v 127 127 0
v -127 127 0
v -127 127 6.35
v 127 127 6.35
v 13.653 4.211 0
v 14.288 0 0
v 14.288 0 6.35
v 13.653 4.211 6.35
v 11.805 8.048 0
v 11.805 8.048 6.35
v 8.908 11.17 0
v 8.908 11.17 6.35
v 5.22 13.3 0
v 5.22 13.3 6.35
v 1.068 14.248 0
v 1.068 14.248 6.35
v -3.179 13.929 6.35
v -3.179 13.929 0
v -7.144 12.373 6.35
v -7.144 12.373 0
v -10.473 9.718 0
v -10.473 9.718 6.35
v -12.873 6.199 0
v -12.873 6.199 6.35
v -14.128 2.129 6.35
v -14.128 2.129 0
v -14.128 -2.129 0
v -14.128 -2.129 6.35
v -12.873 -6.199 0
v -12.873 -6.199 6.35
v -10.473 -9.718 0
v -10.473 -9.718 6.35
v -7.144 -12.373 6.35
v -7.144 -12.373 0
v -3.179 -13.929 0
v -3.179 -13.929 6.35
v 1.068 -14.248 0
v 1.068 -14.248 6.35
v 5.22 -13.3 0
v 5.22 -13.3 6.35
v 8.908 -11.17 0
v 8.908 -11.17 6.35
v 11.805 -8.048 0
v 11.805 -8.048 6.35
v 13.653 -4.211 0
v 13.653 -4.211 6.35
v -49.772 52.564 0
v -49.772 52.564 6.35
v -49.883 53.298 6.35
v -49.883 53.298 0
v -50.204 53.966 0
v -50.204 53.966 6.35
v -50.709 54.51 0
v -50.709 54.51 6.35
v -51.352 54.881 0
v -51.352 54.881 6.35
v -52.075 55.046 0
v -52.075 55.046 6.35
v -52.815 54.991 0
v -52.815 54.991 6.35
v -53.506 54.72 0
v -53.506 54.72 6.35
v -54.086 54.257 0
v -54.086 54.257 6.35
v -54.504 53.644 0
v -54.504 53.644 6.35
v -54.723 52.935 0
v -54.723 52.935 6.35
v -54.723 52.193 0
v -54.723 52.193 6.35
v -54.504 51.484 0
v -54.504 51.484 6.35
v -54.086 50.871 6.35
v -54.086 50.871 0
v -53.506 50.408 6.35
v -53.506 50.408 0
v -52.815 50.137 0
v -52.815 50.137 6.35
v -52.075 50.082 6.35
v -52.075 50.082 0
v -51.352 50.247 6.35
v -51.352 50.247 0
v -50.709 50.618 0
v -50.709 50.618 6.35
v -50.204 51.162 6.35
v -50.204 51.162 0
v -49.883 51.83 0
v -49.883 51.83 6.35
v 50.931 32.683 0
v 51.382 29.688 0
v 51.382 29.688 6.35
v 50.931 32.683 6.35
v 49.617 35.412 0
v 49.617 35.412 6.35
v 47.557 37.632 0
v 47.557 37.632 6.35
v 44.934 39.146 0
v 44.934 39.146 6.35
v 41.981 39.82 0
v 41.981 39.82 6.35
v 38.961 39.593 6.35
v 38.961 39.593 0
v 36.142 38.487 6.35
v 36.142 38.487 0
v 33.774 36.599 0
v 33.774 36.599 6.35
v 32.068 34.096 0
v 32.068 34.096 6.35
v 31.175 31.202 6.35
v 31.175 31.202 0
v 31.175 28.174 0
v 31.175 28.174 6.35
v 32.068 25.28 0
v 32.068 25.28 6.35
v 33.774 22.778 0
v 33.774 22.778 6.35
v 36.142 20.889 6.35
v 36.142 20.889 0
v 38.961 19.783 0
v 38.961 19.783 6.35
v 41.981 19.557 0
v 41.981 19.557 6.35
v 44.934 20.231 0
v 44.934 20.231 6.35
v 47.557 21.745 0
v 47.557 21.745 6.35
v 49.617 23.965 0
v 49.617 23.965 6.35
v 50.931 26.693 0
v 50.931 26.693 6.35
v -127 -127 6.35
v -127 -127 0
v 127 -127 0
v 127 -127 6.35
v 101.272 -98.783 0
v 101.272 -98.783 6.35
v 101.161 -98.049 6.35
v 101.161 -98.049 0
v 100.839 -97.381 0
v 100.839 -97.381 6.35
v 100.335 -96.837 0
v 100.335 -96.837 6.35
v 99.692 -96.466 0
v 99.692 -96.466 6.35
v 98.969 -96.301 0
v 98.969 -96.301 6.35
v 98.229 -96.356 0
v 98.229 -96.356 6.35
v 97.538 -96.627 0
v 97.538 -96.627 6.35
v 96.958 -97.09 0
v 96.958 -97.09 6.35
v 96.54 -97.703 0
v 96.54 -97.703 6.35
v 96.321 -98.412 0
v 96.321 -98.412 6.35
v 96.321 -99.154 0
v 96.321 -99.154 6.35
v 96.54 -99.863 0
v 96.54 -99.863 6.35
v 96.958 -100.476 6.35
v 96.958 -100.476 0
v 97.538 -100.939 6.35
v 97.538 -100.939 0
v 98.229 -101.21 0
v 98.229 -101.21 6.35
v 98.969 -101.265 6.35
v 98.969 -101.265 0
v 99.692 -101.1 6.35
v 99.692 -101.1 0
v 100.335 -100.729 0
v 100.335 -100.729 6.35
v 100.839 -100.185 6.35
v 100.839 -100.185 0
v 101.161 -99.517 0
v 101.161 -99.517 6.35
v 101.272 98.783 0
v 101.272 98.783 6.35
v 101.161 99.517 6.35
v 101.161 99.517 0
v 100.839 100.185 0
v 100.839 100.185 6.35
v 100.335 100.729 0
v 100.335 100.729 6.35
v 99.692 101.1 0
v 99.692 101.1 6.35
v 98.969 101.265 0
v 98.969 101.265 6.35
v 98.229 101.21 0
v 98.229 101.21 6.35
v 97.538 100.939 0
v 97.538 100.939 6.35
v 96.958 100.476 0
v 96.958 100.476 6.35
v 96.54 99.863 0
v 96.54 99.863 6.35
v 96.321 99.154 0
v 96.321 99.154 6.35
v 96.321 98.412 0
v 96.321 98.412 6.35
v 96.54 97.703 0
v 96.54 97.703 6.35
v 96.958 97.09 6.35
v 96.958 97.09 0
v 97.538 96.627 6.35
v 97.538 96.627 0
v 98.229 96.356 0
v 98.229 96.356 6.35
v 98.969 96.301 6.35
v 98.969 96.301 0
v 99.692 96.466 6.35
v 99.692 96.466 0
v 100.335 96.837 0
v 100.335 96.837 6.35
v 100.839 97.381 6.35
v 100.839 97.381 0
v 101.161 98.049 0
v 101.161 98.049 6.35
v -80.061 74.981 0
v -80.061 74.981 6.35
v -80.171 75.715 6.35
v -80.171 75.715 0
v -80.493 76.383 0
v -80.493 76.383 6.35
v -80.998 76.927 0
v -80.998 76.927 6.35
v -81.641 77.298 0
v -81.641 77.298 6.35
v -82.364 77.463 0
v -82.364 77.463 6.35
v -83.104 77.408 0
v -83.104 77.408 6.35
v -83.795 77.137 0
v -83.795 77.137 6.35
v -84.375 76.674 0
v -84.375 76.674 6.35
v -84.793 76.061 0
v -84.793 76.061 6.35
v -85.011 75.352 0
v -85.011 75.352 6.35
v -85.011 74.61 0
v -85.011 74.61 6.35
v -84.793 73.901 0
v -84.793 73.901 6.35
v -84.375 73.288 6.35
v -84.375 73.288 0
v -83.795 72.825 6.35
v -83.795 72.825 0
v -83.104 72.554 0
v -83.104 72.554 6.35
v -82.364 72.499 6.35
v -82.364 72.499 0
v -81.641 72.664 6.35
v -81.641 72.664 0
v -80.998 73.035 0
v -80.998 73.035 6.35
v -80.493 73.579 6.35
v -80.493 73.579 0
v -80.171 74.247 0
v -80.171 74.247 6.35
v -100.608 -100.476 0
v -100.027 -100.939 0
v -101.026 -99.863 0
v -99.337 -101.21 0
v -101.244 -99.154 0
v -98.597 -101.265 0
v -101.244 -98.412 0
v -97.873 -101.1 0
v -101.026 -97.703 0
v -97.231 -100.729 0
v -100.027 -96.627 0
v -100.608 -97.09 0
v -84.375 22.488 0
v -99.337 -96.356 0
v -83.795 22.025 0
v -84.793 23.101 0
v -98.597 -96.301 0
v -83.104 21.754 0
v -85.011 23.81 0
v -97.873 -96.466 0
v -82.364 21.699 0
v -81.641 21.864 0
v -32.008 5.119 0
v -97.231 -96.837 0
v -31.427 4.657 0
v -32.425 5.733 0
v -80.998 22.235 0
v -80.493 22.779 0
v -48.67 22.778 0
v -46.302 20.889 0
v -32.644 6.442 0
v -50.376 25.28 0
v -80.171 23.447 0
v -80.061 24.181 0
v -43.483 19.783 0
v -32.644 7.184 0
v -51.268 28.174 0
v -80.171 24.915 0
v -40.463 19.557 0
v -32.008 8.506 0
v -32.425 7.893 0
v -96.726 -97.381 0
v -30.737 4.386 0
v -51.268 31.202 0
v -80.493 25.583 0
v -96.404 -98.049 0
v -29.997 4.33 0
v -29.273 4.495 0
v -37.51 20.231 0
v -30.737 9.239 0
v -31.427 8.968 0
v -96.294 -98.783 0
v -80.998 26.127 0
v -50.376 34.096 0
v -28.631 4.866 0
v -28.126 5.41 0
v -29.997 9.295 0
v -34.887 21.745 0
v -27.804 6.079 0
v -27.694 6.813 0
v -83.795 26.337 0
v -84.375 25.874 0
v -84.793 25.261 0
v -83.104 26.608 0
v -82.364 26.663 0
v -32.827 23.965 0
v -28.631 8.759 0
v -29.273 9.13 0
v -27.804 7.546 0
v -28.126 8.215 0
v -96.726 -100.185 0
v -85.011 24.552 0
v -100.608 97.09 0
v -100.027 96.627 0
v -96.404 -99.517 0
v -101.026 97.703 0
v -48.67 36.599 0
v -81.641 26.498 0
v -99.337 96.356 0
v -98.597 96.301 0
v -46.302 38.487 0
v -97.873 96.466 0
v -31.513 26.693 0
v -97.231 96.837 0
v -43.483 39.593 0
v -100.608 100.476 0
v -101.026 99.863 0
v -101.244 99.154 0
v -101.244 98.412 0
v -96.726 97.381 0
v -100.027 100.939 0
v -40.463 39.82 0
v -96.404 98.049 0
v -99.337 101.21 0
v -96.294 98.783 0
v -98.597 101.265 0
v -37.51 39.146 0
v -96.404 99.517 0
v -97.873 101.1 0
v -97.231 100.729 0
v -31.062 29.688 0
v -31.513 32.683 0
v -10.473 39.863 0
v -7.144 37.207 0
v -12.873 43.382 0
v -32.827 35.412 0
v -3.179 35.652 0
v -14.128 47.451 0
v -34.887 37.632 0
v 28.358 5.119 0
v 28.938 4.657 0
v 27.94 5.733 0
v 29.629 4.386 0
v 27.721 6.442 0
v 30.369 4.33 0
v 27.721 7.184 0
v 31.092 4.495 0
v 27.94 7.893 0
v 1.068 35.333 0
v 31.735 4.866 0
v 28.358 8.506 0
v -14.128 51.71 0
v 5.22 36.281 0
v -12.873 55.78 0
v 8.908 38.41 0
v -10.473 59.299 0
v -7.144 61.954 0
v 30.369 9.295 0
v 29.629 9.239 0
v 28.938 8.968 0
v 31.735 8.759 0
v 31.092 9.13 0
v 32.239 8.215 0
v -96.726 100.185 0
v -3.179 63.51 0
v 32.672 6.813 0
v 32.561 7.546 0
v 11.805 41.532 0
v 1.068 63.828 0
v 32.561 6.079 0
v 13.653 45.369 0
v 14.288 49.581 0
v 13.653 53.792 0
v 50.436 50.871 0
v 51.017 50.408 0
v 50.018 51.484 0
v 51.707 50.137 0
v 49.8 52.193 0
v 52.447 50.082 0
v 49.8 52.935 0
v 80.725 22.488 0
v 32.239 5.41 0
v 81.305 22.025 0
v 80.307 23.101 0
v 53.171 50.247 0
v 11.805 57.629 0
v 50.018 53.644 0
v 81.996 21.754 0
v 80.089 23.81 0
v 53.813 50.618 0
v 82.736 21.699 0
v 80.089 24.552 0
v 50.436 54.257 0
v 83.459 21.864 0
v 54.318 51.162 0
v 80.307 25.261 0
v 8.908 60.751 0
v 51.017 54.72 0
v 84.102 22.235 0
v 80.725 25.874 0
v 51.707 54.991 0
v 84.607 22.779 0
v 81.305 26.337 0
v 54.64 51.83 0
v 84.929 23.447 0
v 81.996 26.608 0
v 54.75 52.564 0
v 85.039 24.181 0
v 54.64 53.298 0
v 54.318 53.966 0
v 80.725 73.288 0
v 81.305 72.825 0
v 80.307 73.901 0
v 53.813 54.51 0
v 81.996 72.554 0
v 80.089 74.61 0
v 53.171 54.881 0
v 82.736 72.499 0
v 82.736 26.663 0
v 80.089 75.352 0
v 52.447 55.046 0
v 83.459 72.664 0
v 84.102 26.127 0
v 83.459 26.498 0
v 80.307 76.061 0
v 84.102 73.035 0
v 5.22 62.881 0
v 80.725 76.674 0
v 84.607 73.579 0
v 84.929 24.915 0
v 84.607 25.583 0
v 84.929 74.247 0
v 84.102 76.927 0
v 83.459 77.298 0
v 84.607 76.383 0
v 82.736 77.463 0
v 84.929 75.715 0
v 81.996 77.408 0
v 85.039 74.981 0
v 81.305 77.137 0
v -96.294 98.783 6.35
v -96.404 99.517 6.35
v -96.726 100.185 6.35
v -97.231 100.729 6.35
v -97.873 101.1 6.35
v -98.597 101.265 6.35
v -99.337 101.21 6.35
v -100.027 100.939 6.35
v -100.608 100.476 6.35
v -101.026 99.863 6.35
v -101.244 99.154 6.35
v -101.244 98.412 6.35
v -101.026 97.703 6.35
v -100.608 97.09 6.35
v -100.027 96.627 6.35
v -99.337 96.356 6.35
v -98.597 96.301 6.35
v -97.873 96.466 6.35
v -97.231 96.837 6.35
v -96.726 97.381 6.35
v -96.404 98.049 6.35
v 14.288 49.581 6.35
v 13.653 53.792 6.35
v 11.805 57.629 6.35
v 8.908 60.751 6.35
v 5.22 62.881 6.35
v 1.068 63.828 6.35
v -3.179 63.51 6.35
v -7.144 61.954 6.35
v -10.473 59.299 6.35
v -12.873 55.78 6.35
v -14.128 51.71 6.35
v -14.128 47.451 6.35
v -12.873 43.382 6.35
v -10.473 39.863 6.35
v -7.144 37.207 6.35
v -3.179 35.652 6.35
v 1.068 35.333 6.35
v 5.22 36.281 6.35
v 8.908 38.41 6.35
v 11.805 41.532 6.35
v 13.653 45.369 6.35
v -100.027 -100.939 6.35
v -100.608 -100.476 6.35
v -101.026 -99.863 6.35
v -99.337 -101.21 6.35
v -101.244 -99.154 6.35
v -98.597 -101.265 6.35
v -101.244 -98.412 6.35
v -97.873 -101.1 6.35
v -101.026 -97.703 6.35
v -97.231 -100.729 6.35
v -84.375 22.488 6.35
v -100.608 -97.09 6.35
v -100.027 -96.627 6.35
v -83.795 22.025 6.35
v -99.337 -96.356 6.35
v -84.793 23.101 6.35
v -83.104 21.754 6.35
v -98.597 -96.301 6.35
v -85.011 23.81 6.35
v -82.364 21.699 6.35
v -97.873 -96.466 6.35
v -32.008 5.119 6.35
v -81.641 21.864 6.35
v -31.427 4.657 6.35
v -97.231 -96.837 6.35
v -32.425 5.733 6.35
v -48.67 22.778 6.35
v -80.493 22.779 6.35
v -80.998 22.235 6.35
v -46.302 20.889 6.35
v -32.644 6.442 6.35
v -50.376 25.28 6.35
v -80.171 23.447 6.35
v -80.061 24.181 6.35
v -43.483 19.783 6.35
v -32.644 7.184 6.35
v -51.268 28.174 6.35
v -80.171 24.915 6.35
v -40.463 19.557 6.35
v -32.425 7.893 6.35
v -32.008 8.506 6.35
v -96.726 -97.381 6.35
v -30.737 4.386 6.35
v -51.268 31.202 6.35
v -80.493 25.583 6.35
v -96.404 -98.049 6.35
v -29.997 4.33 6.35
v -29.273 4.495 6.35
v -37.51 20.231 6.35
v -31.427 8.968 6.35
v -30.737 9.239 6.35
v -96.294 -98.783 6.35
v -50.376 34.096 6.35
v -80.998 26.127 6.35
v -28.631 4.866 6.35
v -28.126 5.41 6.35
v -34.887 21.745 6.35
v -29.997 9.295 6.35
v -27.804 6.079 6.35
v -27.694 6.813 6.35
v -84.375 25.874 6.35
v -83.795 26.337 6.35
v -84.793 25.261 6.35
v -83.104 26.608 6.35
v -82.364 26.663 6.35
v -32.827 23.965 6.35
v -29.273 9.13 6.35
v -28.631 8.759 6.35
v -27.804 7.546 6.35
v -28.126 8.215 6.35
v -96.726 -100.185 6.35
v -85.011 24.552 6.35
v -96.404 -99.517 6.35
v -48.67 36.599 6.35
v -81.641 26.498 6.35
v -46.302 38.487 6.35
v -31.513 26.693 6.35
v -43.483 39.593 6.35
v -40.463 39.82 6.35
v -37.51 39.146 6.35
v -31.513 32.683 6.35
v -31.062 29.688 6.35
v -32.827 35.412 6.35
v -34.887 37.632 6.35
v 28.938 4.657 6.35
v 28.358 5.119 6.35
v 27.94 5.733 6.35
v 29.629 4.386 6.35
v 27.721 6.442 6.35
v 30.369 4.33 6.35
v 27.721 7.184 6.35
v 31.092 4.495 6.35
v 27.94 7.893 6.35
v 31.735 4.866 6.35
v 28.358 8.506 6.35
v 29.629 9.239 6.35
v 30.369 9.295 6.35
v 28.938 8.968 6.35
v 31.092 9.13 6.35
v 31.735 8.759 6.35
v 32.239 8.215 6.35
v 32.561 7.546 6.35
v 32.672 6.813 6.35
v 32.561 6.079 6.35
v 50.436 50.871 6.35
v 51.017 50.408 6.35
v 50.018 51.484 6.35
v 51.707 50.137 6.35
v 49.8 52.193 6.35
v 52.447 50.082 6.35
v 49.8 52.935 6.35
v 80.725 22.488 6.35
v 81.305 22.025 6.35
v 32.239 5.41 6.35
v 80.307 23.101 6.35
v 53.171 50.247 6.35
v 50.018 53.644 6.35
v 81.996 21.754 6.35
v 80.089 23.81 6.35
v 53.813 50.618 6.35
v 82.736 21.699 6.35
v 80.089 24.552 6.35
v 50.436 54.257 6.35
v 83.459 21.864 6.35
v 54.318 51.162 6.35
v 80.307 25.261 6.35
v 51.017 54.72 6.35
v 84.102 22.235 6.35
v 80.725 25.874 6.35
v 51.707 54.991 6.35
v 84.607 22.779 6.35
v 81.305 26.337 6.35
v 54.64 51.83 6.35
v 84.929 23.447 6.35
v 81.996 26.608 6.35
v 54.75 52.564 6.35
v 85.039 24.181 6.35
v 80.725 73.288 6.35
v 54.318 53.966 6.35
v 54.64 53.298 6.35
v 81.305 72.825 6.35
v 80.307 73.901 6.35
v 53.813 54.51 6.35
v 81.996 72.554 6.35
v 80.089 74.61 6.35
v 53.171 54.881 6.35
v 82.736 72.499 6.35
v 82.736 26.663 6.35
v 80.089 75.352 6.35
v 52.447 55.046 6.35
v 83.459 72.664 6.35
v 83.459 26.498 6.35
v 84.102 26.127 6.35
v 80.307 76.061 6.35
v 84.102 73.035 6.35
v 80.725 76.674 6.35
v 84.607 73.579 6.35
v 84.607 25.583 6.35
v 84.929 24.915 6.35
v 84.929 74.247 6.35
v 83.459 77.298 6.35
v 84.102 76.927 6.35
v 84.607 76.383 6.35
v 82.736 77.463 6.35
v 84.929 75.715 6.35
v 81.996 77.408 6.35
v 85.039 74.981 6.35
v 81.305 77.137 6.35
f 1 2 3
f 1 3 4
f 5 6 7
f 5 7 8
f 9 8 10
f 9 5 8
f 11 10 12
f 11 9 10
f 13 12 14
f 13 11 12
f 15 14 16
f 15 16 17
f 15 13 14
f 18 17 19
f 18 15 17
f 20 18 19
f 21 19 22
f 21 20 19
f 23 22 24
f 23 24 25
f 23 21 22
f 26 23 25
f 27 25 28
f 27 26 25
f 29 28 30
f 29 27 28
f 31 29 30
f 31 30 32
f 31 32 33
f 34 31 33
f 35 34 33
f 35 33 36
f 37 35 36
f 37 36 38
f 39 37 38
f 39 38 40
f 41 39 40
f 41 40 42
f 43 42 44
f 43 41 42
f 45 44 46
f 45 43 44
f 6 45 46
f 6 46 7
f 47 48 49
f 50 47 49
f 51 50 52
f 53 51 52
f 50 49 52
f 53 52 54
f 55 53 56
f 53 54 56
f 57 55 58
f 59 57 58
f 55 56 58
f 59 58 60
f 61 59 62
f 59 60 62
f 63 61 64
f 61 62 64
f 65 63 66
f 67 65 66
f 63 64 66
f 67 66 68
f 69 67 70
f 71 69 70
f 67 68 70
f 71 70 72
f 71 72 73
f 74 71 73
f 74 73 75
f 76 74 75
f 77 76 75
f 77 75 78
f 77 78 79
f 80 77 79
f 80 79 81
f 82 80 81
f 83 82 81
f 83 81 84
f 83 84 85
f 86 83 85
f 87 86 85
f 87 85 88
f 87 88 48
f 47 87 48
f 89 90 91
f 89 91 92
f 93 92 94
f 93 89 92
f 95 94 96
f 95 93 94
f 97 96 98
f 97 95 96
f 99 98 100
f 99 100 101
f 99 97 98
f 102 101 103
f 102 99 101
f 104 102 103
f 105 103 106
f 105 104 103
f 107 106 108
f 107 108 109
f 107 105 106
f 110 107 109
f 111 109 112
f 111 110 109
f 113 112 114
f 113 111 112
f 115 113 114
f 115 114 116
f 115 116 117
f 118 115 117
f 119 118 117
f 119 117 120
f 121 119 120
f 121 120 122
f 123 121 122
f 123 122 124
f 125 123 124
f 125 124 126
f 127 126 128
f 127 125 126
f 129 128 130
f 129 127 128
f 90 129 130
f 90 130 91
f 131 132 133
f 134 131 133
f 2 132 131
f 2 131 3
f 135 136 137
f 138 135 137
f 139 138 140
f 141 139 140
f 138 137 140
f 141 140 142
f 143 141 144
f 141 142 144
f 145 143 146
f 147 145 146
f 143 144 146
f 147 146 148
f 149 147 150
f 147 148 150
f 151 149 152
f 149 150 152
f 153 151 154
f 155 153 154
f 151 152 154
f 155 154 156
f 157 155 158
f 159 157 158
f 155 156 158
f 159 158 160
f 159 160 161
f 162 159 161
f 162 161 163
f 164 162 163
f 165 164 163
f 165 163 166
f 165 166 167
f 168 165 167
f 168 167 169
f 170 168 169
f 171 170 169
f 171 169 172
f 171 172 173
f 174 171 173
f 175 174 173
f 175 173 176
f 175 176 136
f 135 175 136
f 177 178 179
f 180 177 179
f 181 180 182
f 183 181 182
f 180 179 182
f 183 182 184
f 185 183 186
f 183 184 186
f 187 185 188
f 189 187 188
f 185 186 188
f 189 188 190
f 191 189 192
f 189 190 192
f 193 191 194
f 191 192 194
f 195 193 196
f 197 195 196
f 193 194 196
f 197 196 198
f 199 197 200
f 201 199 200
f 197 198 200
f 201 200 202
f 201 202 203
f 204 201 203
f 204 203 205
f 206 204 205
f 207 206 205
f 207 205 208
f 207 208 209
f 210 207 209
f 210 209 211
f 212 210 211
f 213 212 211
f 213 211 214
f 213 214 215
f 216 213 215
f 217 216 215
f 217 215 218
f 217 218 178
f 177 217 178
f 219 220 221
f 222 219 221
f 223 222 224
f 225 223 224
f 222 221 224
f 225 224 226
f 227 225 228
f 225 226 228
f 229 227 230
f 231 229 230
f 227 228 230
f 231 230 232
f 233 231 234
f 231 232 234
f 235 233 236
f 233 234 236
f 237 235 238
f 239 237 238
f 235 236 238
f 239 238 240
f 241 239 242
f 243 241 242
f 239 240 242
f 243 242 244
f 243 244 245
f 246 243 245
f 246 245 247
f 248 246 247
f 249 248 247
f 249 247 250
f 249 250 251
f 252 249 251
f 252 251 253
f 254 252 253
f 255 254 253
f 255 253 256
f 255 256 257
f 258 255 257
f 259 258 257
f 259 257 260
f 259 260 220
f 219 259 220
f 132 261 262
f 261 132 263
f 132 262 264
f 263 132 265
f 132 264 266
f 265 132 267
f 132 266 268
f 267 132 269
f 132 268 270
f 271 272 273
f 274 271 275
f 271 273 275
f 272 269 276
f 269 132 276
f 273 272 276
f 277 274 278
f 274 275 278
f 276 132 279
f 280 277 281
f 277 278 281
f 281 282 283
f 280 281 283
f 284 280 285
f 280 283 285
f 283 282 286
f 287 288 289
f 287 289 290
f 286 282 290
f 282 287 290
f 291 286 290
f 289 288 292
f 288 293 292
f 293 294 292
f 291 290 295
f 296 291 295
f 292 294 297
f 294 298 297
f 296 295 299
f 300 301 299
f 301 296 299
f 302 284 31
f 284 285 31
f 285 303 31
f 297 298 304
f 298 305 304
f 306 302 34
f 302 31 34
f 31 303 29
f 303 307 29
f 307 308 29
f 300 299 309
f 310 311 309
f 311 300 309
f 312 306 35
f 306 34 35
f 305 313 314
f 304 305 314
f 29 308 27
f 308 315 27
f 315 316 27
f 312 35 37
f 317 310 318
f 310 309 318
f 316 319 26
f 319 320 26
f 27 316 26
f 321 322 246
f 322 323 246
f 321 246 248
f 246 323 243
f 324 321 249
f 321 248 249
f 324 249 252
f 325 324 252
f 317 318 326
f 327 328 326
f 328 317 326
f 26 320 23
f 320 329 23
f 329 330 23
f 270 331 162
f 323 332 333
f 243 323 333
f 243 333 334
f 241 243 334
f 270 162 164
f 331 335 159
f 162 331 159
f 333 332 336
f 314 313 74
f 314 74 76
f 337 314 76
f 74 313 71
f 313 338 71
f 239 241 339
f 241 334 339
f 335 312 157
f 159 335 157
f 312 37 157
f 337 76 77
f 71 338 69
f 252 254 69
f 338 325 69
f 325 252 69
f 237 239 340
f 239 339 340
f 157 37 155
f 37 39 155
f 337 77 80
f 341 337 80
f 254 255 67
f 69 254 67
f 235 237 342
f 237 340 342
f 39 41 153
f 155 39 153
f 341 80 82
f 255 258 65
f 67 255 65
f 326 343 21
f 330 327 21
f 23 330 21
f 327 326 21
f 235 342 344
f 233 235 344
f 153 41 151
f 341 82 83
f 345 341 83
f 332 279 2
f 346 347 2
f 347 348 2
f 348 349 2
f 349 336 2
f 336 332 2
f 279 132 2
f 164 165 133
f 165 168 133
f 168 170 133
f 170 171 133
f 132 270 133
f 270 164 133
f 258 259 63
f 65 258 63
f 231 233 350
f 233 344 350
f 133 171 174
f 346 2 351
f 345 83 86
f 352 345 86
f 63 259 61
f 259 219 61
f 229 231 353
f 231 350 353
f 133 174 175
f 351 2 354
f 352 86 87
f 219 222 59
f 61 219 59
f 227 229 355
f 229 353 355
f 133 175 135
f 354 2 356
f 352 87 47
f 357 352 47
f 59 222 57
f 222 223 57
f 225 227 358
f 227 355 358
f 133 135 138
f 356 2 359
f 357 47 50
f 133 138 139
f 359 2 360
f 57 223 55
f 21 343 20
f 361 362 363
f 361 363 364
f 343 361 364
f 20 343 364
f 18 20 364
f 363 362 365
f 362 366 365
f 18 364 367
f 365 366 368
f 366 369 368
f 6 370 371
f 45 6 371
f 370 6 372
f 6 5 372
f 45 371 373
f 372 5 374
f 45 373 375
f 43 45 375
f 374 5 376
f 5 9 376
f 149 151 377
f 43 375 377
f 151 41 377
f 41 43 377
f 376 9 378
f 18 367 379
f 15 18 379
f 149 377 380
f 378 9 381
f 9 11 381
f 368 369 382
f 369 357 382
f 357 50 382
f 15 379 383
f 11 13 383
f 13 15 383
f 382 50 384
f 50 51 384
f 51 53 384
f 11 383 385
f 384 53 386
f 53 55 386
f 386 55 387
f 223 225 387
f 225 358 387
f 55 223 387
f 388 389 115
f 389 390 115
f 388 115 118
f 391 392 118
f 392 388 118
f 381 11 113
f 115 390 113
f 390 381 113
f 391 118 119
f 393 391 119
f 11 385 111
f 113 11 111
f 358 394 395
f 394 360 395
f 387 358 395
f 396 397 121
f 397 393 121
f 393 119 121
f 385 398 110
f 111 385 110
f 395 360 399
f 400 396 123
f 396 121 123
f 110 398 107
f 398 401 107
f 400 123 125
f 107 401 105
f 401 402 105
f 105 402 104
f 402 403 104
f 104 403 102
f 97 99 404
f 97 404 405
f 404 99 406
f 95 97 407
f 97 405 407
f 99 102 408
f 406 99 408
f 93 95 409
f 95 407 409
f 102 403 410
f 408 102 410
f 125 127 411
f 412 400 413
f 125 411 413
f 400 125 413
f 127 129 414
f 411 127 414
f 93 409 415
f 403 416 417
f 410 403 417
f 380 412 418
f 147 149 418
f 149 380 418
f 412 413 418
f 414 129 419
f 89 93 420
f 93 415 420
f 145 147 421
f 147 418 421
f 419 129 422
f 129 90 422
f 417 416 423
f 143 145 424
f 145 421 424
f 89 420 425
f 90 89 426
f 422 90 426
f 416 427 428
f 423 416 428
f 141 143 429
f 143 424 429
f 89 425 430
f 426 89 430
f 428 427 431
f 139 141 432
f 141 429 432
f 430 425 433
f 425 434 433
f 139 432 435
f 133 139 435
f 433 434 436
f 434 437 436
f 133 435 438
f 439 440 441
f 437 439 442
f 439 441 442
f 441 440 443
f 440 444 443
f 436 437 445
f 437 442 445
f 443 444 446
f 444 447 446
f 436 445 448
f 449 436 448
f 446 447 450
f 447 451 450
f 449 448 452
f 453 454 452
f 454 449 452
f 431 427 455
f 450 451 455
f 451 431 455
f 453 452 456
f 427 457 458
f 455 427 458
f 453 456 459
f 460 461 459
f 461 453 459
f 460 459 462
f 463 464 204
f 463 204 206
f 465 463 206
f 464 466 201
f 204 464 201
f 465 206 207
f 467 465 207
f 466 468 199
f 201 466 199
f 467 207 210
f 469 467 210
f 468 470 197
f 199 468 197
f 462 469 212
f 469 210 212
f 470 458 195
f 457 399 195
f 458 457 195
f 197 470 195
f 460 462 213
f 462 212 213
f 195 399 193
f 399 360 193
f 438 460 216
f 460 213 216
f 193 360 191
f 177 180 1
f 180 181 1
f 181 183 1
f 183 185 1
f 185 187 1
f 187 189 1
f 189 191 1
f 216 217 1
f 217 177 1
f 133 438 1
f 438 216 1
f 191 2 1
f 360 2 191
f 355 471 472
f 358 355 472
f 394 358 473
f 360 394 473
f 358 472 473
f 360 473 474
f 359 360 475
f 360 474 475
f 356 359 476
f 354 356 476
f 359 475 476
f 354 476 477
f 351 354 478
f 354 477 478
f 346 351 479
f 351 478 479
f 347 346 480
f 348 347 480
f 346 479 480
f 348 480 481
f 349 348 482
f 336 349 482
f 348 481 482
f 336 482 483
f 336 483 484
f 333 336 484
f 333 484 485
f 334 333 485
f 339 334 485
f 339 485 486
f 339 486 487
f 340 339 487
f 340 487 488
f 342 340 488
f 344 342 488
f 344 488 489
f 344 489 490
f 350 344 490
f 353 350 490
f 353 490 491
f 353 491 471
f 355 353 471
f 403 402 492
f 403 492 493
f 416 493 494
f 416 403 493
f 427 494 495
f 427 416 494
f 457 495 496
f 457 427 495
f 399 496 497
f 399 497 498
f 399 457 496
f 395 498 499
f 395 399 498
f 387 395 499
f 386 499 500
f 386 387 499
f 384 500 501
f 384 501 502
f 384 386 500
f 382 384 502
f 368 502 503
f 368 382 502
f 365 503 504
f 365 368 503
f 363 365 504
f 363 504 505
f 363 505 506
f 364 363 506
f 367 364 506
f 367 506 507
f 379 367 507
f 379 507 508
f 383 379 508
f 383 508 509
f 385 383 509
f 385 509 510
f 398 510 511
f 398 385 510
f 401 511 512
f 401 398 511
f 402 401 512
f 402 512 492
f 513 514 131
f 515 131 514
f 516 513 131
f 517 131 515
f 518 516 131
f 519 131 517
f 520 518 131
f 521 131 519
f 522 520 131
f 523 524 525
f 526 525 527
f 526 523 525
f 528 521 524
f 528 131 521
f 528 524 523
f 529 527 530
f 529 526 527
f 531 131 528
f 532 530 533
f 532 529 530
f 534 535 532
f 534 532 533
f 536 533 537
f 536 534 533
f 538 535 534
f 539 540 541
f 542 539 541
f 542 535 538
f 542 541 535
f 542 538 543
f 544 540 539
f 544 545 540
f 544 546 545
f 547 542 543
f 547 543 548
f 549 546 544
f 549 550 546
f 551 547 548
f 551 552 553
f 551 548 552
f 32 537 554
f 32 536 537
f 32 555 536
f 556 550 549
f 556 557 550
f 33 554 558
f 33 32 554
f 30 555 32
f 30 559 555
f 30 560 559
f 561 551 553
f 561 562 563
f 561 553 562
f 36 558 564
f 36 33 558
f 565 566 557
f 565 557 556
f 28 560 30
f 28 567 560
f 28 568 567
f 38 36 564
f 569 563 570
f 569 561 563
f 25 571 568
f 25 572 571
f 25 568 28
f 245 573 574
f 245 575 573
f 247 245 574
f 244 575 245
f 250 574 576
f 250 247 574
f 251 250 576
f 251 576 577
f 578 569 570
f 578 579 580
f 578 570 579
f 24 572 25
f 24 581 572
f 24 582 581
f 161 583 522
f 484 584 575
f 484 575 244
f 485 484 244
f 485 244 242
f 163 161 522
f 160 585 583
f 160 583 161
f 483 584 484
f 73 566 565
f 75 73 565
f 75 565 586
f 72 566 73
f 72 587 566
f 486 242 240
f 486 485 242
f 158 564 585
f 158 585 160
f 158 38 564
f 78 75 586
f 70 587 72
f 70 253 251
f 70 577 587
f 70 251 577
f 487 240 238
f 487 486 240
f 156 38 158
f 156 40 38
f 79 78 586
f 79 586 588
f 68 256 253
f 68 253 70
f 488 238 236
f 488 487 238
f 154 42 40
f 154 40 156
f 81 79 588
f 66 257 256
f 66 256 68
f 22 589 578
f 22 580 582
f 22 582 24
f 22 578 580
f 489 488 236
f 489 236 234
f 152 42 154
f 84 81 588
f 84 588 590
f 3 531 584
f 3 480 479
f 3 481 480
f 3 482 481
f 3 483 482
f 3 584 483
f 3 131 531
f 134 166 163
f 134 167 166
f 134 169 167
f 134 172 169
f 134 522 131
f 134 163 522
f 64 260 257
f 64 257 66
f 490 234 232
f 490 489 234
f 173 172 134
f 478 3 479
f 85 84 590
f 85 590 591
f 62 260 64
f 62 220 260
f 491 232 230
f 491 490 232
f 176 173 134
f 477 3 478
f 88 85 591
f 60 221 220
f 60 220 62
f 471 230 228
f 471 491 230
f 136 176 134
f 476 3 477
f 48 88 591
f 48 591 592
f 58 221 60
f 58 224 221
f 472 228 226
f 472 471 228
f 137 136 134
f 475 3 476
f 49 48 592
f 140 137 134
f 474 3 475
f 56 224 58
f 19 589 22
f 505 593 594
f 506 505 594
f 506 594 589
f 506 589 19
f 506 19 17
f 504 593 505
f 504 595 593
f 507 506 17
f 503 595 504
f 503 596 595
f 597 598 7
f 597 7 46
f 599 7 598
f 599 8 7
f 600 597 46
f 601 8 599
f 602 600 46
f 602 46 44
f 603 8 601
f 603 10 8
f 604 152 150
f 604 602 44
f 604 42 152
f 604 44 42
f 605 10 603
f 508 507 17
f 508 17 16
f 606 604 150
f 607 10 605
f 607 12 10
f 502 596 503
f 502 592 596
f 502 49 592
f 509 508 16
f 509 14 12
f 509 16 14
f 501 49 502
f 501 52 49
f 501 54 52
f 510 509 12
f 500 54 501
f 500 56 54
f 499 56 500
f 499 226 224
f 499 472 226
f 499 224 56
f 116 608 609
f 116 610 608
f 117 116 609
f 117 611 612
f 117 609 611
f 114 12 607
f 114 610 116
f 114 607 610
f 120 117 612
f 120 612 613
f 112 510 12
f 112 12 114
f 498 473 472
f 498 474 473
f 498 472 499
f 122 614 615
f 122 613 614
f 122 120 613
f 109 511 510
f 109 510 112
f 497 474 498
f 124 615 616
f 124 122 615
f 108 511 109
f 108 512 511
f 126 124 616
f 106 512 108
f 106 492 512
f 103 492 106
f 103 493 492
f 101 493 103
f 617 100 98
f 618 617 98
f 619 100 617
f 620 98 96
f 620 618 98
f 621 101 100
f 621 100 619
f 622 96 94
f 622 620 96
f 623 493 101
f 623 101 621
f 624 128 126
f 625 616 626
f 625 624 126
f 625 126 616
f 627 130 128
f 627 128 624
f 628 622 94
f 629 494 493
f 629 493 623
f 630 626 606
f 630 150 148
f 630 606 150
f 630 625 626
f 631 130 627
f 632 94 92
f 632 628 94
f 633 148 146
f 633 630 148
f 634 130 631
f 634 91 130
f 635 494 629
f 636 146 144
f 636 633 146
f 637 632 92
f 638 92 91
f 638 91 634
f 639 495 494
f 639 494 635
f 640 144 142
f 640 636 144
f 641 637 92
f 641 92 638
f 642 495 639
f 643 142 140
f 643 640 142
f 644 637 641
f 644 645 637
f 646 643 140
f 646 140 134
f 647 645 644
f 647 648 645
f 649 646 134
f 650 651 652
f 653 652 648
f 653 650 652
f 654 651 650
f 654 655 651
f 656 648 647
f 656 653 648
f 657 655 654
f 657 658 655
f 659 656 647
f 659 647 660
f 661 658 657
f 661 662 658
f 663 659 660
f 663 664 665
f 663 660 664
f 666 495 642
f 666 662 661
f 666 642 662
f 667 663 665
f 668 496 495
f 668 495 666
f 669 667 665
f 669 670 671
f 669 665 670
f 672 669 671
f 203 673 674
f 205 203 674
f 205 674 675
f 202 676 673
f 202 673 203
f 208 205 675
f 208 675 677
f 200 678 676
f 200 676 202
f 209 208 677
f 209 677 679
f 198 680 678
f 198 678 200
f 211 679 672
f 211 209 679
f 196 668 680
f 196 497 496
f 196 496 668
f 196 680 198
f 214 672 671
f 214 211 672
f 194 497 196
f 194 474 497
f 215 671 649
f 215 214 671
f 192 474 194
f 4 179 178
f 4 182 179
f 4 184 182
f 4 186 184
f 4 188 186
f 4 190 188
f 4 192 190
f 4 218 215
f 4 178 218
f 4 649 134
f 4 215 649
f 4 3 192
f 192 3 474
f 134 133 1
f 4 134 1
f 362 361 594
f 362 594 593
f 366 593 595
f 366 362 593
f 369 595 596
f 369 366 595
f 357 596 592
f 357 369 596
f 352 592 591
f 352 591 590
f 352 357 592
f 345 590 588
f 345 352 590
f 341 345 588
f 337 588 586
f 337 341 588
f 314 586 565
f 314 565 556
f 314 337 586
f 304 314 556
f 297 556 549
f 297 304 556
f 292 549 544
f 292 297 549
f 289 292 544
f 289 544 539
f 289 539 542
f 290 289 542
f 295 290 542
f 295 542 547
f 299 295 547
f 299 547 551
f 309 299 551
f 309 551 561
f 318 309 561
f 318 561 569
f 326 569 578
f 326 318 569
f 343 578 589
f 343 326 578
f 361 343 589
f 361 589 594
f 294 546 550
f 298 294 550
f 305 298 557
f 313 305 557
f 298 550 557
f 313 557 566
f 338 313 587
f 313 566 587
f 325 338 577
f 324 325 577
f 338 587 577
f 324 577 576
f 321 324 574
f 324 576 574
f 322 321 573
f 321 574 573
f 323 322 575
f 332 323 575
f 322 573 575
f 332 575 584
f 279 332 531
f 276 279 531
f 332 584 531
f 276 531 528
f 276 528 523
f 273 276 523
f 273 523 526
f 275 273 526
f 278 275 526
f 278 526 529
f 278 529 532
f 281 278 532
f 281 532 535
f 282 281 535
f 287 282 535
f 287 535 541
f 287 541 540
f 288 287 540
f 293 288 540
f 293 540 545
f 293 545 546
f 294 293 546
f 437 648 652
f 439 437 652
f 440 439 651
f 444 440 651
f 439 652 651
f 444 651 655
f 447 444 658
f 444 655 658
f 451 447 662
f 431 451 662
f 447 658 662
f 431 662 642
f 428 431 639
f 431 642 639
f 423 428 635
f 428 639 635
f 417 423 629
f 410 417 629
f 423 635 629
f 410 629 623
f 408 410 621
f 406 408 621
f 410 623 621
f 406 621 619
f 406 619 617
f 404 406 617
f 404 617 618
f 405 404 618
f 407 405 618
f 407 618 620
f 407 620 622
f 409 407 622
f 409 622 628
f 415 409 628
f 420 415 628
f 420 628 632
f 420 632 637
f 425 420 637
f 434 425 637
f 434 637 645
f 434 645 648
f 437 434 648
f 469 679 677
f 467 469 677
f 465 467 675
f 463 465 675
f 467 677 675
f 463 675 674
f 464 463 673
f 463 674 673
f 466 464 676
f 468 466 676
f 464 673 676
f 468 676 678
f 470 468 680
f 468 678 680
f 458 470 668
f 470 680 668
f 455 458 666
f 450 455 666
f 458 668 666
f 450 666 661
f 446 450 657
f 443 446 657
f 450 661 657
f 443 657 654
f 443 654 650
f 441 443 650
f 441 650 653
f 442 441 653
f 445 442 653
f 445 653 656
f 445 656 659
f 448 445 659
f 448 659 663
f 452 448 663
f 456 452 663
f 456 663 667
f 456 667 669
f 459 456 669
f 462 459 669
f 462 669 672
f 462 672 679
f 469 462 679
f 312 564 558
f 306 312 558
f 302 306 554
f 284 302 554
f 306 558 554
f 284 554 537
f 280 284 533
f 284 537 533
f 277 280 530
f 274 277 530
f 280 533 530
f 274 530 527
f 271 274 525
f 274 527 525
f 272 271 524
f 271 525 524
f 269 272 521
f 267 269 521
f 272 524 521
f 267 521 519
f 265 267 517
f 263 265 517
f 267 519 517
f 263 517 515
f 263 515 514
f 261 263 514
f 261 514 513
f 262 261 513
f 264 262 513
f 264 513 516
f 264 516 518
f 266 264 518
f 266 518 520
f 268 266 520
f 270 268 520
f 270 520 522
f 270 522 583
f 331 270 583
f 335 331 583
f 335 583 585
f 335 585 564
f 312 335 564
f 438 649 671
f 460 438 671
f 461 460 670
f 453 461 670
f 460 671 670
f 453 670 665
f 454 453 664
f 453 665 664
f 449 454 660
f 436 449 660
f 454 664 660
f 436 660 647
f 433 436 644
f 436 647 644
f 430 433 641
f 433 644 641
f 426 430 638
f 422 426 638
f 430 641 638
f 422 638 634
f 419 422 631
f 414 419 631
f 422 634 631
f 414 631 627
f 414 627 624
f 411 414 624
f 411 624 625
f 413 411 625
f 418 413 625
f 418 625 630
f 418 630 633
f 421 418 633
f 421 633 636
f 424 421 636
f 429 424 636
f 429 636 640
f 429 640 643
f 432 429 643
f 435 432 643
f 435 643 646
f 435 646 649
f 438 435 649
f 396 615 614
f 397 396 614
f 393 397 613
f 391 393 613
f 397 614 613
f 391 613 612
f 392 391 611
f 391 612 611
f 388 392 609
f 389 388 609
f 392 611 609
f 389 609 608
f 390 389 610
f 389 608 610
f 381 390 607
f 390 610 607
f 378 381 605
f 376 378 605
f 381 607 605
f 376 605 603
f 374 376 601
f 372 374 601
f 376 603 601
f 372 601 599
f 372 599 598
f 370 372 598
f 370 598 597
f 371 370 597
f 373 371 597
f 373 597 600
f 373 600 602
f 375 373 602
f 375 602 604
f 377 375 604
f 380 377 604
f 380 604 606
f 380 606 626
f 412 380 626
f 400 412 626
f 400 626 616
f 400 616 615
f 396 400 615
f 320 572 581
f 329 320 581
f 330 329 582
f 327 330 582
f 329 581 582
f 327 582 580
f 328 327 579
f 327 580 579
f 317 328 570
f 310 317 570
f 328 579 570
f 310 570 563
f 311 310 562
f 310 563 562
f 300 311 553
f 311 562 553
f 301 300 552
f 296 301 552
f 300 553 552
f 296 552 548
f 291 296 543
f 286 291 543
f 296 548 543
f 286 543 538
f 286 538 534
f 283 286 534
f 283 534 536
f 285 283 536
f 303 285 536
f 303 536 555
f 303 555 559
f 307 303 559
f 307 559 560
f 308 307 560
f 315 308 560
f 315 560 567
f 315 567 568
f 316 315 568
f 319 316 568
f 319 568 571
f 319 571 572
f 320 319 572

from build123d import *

# Parameters (mm, degrees)
SKETCH1_W                  = 254
SKETCH1_H                  = 254
SKETCH1_R                  = 10.16
SKETCH1_R_2                = 14.2875
BOSS_EXTRUDE2_DEPTH        = 6.35
F_9_0_196_DIAMETER_HOLE1_D = 4.9784


with BuildPart() as part:
    # Sketch1 → Boss-Extrude2 (new body)
    with BuildSketch(Plane.XY):
        Rectangle(SKETCH1_W, SKETCH1_H)
        with Locations((-41.221968309, 29.688201844)):
            Circle(SKETCH1_R, mode=Mode.SUBTRACT)
        with Locations((0, 49.5808)):
            Circle(SKETCH1_R_2, mode=Mode.SUBTRACT)
        Circle(SKETCH1_R_2, mode=Mode.SUBTRACT)
        with Locations((41.221968309, 29.688201844)):
            Circle(SKETCH1_R, mode=Mode.SUBTRACT)
    extrude(amount=BOSS_EXTRUDE2_DEPTH)

    # #9 (0.196) Diameter Hole1 (through all)
    with Locations(Plane(origin=(0, 0, 0), x_dir=(-1, 0, 0), z_dir=(0, 0, -1))):
        with Locations((-98.782817332, 98.782817332), (-52.261145976, 52.563877931), (-30.182790642, 6.812525757), (30.182790642, 6.812525757), (52.261145976, 52.563877931), (98.782817332, 98.782817332), (98.782817332, -98.782817332), (-98.782817332, -98.782817332), (-82.55, 74.9808), (-82.55, 24.1808), (82.55, 74.9808), (82.55, 24.1808)):
            Hole(F_9_0_196_DIAMETER_HOLE1_D / 2)


solid = part.part
